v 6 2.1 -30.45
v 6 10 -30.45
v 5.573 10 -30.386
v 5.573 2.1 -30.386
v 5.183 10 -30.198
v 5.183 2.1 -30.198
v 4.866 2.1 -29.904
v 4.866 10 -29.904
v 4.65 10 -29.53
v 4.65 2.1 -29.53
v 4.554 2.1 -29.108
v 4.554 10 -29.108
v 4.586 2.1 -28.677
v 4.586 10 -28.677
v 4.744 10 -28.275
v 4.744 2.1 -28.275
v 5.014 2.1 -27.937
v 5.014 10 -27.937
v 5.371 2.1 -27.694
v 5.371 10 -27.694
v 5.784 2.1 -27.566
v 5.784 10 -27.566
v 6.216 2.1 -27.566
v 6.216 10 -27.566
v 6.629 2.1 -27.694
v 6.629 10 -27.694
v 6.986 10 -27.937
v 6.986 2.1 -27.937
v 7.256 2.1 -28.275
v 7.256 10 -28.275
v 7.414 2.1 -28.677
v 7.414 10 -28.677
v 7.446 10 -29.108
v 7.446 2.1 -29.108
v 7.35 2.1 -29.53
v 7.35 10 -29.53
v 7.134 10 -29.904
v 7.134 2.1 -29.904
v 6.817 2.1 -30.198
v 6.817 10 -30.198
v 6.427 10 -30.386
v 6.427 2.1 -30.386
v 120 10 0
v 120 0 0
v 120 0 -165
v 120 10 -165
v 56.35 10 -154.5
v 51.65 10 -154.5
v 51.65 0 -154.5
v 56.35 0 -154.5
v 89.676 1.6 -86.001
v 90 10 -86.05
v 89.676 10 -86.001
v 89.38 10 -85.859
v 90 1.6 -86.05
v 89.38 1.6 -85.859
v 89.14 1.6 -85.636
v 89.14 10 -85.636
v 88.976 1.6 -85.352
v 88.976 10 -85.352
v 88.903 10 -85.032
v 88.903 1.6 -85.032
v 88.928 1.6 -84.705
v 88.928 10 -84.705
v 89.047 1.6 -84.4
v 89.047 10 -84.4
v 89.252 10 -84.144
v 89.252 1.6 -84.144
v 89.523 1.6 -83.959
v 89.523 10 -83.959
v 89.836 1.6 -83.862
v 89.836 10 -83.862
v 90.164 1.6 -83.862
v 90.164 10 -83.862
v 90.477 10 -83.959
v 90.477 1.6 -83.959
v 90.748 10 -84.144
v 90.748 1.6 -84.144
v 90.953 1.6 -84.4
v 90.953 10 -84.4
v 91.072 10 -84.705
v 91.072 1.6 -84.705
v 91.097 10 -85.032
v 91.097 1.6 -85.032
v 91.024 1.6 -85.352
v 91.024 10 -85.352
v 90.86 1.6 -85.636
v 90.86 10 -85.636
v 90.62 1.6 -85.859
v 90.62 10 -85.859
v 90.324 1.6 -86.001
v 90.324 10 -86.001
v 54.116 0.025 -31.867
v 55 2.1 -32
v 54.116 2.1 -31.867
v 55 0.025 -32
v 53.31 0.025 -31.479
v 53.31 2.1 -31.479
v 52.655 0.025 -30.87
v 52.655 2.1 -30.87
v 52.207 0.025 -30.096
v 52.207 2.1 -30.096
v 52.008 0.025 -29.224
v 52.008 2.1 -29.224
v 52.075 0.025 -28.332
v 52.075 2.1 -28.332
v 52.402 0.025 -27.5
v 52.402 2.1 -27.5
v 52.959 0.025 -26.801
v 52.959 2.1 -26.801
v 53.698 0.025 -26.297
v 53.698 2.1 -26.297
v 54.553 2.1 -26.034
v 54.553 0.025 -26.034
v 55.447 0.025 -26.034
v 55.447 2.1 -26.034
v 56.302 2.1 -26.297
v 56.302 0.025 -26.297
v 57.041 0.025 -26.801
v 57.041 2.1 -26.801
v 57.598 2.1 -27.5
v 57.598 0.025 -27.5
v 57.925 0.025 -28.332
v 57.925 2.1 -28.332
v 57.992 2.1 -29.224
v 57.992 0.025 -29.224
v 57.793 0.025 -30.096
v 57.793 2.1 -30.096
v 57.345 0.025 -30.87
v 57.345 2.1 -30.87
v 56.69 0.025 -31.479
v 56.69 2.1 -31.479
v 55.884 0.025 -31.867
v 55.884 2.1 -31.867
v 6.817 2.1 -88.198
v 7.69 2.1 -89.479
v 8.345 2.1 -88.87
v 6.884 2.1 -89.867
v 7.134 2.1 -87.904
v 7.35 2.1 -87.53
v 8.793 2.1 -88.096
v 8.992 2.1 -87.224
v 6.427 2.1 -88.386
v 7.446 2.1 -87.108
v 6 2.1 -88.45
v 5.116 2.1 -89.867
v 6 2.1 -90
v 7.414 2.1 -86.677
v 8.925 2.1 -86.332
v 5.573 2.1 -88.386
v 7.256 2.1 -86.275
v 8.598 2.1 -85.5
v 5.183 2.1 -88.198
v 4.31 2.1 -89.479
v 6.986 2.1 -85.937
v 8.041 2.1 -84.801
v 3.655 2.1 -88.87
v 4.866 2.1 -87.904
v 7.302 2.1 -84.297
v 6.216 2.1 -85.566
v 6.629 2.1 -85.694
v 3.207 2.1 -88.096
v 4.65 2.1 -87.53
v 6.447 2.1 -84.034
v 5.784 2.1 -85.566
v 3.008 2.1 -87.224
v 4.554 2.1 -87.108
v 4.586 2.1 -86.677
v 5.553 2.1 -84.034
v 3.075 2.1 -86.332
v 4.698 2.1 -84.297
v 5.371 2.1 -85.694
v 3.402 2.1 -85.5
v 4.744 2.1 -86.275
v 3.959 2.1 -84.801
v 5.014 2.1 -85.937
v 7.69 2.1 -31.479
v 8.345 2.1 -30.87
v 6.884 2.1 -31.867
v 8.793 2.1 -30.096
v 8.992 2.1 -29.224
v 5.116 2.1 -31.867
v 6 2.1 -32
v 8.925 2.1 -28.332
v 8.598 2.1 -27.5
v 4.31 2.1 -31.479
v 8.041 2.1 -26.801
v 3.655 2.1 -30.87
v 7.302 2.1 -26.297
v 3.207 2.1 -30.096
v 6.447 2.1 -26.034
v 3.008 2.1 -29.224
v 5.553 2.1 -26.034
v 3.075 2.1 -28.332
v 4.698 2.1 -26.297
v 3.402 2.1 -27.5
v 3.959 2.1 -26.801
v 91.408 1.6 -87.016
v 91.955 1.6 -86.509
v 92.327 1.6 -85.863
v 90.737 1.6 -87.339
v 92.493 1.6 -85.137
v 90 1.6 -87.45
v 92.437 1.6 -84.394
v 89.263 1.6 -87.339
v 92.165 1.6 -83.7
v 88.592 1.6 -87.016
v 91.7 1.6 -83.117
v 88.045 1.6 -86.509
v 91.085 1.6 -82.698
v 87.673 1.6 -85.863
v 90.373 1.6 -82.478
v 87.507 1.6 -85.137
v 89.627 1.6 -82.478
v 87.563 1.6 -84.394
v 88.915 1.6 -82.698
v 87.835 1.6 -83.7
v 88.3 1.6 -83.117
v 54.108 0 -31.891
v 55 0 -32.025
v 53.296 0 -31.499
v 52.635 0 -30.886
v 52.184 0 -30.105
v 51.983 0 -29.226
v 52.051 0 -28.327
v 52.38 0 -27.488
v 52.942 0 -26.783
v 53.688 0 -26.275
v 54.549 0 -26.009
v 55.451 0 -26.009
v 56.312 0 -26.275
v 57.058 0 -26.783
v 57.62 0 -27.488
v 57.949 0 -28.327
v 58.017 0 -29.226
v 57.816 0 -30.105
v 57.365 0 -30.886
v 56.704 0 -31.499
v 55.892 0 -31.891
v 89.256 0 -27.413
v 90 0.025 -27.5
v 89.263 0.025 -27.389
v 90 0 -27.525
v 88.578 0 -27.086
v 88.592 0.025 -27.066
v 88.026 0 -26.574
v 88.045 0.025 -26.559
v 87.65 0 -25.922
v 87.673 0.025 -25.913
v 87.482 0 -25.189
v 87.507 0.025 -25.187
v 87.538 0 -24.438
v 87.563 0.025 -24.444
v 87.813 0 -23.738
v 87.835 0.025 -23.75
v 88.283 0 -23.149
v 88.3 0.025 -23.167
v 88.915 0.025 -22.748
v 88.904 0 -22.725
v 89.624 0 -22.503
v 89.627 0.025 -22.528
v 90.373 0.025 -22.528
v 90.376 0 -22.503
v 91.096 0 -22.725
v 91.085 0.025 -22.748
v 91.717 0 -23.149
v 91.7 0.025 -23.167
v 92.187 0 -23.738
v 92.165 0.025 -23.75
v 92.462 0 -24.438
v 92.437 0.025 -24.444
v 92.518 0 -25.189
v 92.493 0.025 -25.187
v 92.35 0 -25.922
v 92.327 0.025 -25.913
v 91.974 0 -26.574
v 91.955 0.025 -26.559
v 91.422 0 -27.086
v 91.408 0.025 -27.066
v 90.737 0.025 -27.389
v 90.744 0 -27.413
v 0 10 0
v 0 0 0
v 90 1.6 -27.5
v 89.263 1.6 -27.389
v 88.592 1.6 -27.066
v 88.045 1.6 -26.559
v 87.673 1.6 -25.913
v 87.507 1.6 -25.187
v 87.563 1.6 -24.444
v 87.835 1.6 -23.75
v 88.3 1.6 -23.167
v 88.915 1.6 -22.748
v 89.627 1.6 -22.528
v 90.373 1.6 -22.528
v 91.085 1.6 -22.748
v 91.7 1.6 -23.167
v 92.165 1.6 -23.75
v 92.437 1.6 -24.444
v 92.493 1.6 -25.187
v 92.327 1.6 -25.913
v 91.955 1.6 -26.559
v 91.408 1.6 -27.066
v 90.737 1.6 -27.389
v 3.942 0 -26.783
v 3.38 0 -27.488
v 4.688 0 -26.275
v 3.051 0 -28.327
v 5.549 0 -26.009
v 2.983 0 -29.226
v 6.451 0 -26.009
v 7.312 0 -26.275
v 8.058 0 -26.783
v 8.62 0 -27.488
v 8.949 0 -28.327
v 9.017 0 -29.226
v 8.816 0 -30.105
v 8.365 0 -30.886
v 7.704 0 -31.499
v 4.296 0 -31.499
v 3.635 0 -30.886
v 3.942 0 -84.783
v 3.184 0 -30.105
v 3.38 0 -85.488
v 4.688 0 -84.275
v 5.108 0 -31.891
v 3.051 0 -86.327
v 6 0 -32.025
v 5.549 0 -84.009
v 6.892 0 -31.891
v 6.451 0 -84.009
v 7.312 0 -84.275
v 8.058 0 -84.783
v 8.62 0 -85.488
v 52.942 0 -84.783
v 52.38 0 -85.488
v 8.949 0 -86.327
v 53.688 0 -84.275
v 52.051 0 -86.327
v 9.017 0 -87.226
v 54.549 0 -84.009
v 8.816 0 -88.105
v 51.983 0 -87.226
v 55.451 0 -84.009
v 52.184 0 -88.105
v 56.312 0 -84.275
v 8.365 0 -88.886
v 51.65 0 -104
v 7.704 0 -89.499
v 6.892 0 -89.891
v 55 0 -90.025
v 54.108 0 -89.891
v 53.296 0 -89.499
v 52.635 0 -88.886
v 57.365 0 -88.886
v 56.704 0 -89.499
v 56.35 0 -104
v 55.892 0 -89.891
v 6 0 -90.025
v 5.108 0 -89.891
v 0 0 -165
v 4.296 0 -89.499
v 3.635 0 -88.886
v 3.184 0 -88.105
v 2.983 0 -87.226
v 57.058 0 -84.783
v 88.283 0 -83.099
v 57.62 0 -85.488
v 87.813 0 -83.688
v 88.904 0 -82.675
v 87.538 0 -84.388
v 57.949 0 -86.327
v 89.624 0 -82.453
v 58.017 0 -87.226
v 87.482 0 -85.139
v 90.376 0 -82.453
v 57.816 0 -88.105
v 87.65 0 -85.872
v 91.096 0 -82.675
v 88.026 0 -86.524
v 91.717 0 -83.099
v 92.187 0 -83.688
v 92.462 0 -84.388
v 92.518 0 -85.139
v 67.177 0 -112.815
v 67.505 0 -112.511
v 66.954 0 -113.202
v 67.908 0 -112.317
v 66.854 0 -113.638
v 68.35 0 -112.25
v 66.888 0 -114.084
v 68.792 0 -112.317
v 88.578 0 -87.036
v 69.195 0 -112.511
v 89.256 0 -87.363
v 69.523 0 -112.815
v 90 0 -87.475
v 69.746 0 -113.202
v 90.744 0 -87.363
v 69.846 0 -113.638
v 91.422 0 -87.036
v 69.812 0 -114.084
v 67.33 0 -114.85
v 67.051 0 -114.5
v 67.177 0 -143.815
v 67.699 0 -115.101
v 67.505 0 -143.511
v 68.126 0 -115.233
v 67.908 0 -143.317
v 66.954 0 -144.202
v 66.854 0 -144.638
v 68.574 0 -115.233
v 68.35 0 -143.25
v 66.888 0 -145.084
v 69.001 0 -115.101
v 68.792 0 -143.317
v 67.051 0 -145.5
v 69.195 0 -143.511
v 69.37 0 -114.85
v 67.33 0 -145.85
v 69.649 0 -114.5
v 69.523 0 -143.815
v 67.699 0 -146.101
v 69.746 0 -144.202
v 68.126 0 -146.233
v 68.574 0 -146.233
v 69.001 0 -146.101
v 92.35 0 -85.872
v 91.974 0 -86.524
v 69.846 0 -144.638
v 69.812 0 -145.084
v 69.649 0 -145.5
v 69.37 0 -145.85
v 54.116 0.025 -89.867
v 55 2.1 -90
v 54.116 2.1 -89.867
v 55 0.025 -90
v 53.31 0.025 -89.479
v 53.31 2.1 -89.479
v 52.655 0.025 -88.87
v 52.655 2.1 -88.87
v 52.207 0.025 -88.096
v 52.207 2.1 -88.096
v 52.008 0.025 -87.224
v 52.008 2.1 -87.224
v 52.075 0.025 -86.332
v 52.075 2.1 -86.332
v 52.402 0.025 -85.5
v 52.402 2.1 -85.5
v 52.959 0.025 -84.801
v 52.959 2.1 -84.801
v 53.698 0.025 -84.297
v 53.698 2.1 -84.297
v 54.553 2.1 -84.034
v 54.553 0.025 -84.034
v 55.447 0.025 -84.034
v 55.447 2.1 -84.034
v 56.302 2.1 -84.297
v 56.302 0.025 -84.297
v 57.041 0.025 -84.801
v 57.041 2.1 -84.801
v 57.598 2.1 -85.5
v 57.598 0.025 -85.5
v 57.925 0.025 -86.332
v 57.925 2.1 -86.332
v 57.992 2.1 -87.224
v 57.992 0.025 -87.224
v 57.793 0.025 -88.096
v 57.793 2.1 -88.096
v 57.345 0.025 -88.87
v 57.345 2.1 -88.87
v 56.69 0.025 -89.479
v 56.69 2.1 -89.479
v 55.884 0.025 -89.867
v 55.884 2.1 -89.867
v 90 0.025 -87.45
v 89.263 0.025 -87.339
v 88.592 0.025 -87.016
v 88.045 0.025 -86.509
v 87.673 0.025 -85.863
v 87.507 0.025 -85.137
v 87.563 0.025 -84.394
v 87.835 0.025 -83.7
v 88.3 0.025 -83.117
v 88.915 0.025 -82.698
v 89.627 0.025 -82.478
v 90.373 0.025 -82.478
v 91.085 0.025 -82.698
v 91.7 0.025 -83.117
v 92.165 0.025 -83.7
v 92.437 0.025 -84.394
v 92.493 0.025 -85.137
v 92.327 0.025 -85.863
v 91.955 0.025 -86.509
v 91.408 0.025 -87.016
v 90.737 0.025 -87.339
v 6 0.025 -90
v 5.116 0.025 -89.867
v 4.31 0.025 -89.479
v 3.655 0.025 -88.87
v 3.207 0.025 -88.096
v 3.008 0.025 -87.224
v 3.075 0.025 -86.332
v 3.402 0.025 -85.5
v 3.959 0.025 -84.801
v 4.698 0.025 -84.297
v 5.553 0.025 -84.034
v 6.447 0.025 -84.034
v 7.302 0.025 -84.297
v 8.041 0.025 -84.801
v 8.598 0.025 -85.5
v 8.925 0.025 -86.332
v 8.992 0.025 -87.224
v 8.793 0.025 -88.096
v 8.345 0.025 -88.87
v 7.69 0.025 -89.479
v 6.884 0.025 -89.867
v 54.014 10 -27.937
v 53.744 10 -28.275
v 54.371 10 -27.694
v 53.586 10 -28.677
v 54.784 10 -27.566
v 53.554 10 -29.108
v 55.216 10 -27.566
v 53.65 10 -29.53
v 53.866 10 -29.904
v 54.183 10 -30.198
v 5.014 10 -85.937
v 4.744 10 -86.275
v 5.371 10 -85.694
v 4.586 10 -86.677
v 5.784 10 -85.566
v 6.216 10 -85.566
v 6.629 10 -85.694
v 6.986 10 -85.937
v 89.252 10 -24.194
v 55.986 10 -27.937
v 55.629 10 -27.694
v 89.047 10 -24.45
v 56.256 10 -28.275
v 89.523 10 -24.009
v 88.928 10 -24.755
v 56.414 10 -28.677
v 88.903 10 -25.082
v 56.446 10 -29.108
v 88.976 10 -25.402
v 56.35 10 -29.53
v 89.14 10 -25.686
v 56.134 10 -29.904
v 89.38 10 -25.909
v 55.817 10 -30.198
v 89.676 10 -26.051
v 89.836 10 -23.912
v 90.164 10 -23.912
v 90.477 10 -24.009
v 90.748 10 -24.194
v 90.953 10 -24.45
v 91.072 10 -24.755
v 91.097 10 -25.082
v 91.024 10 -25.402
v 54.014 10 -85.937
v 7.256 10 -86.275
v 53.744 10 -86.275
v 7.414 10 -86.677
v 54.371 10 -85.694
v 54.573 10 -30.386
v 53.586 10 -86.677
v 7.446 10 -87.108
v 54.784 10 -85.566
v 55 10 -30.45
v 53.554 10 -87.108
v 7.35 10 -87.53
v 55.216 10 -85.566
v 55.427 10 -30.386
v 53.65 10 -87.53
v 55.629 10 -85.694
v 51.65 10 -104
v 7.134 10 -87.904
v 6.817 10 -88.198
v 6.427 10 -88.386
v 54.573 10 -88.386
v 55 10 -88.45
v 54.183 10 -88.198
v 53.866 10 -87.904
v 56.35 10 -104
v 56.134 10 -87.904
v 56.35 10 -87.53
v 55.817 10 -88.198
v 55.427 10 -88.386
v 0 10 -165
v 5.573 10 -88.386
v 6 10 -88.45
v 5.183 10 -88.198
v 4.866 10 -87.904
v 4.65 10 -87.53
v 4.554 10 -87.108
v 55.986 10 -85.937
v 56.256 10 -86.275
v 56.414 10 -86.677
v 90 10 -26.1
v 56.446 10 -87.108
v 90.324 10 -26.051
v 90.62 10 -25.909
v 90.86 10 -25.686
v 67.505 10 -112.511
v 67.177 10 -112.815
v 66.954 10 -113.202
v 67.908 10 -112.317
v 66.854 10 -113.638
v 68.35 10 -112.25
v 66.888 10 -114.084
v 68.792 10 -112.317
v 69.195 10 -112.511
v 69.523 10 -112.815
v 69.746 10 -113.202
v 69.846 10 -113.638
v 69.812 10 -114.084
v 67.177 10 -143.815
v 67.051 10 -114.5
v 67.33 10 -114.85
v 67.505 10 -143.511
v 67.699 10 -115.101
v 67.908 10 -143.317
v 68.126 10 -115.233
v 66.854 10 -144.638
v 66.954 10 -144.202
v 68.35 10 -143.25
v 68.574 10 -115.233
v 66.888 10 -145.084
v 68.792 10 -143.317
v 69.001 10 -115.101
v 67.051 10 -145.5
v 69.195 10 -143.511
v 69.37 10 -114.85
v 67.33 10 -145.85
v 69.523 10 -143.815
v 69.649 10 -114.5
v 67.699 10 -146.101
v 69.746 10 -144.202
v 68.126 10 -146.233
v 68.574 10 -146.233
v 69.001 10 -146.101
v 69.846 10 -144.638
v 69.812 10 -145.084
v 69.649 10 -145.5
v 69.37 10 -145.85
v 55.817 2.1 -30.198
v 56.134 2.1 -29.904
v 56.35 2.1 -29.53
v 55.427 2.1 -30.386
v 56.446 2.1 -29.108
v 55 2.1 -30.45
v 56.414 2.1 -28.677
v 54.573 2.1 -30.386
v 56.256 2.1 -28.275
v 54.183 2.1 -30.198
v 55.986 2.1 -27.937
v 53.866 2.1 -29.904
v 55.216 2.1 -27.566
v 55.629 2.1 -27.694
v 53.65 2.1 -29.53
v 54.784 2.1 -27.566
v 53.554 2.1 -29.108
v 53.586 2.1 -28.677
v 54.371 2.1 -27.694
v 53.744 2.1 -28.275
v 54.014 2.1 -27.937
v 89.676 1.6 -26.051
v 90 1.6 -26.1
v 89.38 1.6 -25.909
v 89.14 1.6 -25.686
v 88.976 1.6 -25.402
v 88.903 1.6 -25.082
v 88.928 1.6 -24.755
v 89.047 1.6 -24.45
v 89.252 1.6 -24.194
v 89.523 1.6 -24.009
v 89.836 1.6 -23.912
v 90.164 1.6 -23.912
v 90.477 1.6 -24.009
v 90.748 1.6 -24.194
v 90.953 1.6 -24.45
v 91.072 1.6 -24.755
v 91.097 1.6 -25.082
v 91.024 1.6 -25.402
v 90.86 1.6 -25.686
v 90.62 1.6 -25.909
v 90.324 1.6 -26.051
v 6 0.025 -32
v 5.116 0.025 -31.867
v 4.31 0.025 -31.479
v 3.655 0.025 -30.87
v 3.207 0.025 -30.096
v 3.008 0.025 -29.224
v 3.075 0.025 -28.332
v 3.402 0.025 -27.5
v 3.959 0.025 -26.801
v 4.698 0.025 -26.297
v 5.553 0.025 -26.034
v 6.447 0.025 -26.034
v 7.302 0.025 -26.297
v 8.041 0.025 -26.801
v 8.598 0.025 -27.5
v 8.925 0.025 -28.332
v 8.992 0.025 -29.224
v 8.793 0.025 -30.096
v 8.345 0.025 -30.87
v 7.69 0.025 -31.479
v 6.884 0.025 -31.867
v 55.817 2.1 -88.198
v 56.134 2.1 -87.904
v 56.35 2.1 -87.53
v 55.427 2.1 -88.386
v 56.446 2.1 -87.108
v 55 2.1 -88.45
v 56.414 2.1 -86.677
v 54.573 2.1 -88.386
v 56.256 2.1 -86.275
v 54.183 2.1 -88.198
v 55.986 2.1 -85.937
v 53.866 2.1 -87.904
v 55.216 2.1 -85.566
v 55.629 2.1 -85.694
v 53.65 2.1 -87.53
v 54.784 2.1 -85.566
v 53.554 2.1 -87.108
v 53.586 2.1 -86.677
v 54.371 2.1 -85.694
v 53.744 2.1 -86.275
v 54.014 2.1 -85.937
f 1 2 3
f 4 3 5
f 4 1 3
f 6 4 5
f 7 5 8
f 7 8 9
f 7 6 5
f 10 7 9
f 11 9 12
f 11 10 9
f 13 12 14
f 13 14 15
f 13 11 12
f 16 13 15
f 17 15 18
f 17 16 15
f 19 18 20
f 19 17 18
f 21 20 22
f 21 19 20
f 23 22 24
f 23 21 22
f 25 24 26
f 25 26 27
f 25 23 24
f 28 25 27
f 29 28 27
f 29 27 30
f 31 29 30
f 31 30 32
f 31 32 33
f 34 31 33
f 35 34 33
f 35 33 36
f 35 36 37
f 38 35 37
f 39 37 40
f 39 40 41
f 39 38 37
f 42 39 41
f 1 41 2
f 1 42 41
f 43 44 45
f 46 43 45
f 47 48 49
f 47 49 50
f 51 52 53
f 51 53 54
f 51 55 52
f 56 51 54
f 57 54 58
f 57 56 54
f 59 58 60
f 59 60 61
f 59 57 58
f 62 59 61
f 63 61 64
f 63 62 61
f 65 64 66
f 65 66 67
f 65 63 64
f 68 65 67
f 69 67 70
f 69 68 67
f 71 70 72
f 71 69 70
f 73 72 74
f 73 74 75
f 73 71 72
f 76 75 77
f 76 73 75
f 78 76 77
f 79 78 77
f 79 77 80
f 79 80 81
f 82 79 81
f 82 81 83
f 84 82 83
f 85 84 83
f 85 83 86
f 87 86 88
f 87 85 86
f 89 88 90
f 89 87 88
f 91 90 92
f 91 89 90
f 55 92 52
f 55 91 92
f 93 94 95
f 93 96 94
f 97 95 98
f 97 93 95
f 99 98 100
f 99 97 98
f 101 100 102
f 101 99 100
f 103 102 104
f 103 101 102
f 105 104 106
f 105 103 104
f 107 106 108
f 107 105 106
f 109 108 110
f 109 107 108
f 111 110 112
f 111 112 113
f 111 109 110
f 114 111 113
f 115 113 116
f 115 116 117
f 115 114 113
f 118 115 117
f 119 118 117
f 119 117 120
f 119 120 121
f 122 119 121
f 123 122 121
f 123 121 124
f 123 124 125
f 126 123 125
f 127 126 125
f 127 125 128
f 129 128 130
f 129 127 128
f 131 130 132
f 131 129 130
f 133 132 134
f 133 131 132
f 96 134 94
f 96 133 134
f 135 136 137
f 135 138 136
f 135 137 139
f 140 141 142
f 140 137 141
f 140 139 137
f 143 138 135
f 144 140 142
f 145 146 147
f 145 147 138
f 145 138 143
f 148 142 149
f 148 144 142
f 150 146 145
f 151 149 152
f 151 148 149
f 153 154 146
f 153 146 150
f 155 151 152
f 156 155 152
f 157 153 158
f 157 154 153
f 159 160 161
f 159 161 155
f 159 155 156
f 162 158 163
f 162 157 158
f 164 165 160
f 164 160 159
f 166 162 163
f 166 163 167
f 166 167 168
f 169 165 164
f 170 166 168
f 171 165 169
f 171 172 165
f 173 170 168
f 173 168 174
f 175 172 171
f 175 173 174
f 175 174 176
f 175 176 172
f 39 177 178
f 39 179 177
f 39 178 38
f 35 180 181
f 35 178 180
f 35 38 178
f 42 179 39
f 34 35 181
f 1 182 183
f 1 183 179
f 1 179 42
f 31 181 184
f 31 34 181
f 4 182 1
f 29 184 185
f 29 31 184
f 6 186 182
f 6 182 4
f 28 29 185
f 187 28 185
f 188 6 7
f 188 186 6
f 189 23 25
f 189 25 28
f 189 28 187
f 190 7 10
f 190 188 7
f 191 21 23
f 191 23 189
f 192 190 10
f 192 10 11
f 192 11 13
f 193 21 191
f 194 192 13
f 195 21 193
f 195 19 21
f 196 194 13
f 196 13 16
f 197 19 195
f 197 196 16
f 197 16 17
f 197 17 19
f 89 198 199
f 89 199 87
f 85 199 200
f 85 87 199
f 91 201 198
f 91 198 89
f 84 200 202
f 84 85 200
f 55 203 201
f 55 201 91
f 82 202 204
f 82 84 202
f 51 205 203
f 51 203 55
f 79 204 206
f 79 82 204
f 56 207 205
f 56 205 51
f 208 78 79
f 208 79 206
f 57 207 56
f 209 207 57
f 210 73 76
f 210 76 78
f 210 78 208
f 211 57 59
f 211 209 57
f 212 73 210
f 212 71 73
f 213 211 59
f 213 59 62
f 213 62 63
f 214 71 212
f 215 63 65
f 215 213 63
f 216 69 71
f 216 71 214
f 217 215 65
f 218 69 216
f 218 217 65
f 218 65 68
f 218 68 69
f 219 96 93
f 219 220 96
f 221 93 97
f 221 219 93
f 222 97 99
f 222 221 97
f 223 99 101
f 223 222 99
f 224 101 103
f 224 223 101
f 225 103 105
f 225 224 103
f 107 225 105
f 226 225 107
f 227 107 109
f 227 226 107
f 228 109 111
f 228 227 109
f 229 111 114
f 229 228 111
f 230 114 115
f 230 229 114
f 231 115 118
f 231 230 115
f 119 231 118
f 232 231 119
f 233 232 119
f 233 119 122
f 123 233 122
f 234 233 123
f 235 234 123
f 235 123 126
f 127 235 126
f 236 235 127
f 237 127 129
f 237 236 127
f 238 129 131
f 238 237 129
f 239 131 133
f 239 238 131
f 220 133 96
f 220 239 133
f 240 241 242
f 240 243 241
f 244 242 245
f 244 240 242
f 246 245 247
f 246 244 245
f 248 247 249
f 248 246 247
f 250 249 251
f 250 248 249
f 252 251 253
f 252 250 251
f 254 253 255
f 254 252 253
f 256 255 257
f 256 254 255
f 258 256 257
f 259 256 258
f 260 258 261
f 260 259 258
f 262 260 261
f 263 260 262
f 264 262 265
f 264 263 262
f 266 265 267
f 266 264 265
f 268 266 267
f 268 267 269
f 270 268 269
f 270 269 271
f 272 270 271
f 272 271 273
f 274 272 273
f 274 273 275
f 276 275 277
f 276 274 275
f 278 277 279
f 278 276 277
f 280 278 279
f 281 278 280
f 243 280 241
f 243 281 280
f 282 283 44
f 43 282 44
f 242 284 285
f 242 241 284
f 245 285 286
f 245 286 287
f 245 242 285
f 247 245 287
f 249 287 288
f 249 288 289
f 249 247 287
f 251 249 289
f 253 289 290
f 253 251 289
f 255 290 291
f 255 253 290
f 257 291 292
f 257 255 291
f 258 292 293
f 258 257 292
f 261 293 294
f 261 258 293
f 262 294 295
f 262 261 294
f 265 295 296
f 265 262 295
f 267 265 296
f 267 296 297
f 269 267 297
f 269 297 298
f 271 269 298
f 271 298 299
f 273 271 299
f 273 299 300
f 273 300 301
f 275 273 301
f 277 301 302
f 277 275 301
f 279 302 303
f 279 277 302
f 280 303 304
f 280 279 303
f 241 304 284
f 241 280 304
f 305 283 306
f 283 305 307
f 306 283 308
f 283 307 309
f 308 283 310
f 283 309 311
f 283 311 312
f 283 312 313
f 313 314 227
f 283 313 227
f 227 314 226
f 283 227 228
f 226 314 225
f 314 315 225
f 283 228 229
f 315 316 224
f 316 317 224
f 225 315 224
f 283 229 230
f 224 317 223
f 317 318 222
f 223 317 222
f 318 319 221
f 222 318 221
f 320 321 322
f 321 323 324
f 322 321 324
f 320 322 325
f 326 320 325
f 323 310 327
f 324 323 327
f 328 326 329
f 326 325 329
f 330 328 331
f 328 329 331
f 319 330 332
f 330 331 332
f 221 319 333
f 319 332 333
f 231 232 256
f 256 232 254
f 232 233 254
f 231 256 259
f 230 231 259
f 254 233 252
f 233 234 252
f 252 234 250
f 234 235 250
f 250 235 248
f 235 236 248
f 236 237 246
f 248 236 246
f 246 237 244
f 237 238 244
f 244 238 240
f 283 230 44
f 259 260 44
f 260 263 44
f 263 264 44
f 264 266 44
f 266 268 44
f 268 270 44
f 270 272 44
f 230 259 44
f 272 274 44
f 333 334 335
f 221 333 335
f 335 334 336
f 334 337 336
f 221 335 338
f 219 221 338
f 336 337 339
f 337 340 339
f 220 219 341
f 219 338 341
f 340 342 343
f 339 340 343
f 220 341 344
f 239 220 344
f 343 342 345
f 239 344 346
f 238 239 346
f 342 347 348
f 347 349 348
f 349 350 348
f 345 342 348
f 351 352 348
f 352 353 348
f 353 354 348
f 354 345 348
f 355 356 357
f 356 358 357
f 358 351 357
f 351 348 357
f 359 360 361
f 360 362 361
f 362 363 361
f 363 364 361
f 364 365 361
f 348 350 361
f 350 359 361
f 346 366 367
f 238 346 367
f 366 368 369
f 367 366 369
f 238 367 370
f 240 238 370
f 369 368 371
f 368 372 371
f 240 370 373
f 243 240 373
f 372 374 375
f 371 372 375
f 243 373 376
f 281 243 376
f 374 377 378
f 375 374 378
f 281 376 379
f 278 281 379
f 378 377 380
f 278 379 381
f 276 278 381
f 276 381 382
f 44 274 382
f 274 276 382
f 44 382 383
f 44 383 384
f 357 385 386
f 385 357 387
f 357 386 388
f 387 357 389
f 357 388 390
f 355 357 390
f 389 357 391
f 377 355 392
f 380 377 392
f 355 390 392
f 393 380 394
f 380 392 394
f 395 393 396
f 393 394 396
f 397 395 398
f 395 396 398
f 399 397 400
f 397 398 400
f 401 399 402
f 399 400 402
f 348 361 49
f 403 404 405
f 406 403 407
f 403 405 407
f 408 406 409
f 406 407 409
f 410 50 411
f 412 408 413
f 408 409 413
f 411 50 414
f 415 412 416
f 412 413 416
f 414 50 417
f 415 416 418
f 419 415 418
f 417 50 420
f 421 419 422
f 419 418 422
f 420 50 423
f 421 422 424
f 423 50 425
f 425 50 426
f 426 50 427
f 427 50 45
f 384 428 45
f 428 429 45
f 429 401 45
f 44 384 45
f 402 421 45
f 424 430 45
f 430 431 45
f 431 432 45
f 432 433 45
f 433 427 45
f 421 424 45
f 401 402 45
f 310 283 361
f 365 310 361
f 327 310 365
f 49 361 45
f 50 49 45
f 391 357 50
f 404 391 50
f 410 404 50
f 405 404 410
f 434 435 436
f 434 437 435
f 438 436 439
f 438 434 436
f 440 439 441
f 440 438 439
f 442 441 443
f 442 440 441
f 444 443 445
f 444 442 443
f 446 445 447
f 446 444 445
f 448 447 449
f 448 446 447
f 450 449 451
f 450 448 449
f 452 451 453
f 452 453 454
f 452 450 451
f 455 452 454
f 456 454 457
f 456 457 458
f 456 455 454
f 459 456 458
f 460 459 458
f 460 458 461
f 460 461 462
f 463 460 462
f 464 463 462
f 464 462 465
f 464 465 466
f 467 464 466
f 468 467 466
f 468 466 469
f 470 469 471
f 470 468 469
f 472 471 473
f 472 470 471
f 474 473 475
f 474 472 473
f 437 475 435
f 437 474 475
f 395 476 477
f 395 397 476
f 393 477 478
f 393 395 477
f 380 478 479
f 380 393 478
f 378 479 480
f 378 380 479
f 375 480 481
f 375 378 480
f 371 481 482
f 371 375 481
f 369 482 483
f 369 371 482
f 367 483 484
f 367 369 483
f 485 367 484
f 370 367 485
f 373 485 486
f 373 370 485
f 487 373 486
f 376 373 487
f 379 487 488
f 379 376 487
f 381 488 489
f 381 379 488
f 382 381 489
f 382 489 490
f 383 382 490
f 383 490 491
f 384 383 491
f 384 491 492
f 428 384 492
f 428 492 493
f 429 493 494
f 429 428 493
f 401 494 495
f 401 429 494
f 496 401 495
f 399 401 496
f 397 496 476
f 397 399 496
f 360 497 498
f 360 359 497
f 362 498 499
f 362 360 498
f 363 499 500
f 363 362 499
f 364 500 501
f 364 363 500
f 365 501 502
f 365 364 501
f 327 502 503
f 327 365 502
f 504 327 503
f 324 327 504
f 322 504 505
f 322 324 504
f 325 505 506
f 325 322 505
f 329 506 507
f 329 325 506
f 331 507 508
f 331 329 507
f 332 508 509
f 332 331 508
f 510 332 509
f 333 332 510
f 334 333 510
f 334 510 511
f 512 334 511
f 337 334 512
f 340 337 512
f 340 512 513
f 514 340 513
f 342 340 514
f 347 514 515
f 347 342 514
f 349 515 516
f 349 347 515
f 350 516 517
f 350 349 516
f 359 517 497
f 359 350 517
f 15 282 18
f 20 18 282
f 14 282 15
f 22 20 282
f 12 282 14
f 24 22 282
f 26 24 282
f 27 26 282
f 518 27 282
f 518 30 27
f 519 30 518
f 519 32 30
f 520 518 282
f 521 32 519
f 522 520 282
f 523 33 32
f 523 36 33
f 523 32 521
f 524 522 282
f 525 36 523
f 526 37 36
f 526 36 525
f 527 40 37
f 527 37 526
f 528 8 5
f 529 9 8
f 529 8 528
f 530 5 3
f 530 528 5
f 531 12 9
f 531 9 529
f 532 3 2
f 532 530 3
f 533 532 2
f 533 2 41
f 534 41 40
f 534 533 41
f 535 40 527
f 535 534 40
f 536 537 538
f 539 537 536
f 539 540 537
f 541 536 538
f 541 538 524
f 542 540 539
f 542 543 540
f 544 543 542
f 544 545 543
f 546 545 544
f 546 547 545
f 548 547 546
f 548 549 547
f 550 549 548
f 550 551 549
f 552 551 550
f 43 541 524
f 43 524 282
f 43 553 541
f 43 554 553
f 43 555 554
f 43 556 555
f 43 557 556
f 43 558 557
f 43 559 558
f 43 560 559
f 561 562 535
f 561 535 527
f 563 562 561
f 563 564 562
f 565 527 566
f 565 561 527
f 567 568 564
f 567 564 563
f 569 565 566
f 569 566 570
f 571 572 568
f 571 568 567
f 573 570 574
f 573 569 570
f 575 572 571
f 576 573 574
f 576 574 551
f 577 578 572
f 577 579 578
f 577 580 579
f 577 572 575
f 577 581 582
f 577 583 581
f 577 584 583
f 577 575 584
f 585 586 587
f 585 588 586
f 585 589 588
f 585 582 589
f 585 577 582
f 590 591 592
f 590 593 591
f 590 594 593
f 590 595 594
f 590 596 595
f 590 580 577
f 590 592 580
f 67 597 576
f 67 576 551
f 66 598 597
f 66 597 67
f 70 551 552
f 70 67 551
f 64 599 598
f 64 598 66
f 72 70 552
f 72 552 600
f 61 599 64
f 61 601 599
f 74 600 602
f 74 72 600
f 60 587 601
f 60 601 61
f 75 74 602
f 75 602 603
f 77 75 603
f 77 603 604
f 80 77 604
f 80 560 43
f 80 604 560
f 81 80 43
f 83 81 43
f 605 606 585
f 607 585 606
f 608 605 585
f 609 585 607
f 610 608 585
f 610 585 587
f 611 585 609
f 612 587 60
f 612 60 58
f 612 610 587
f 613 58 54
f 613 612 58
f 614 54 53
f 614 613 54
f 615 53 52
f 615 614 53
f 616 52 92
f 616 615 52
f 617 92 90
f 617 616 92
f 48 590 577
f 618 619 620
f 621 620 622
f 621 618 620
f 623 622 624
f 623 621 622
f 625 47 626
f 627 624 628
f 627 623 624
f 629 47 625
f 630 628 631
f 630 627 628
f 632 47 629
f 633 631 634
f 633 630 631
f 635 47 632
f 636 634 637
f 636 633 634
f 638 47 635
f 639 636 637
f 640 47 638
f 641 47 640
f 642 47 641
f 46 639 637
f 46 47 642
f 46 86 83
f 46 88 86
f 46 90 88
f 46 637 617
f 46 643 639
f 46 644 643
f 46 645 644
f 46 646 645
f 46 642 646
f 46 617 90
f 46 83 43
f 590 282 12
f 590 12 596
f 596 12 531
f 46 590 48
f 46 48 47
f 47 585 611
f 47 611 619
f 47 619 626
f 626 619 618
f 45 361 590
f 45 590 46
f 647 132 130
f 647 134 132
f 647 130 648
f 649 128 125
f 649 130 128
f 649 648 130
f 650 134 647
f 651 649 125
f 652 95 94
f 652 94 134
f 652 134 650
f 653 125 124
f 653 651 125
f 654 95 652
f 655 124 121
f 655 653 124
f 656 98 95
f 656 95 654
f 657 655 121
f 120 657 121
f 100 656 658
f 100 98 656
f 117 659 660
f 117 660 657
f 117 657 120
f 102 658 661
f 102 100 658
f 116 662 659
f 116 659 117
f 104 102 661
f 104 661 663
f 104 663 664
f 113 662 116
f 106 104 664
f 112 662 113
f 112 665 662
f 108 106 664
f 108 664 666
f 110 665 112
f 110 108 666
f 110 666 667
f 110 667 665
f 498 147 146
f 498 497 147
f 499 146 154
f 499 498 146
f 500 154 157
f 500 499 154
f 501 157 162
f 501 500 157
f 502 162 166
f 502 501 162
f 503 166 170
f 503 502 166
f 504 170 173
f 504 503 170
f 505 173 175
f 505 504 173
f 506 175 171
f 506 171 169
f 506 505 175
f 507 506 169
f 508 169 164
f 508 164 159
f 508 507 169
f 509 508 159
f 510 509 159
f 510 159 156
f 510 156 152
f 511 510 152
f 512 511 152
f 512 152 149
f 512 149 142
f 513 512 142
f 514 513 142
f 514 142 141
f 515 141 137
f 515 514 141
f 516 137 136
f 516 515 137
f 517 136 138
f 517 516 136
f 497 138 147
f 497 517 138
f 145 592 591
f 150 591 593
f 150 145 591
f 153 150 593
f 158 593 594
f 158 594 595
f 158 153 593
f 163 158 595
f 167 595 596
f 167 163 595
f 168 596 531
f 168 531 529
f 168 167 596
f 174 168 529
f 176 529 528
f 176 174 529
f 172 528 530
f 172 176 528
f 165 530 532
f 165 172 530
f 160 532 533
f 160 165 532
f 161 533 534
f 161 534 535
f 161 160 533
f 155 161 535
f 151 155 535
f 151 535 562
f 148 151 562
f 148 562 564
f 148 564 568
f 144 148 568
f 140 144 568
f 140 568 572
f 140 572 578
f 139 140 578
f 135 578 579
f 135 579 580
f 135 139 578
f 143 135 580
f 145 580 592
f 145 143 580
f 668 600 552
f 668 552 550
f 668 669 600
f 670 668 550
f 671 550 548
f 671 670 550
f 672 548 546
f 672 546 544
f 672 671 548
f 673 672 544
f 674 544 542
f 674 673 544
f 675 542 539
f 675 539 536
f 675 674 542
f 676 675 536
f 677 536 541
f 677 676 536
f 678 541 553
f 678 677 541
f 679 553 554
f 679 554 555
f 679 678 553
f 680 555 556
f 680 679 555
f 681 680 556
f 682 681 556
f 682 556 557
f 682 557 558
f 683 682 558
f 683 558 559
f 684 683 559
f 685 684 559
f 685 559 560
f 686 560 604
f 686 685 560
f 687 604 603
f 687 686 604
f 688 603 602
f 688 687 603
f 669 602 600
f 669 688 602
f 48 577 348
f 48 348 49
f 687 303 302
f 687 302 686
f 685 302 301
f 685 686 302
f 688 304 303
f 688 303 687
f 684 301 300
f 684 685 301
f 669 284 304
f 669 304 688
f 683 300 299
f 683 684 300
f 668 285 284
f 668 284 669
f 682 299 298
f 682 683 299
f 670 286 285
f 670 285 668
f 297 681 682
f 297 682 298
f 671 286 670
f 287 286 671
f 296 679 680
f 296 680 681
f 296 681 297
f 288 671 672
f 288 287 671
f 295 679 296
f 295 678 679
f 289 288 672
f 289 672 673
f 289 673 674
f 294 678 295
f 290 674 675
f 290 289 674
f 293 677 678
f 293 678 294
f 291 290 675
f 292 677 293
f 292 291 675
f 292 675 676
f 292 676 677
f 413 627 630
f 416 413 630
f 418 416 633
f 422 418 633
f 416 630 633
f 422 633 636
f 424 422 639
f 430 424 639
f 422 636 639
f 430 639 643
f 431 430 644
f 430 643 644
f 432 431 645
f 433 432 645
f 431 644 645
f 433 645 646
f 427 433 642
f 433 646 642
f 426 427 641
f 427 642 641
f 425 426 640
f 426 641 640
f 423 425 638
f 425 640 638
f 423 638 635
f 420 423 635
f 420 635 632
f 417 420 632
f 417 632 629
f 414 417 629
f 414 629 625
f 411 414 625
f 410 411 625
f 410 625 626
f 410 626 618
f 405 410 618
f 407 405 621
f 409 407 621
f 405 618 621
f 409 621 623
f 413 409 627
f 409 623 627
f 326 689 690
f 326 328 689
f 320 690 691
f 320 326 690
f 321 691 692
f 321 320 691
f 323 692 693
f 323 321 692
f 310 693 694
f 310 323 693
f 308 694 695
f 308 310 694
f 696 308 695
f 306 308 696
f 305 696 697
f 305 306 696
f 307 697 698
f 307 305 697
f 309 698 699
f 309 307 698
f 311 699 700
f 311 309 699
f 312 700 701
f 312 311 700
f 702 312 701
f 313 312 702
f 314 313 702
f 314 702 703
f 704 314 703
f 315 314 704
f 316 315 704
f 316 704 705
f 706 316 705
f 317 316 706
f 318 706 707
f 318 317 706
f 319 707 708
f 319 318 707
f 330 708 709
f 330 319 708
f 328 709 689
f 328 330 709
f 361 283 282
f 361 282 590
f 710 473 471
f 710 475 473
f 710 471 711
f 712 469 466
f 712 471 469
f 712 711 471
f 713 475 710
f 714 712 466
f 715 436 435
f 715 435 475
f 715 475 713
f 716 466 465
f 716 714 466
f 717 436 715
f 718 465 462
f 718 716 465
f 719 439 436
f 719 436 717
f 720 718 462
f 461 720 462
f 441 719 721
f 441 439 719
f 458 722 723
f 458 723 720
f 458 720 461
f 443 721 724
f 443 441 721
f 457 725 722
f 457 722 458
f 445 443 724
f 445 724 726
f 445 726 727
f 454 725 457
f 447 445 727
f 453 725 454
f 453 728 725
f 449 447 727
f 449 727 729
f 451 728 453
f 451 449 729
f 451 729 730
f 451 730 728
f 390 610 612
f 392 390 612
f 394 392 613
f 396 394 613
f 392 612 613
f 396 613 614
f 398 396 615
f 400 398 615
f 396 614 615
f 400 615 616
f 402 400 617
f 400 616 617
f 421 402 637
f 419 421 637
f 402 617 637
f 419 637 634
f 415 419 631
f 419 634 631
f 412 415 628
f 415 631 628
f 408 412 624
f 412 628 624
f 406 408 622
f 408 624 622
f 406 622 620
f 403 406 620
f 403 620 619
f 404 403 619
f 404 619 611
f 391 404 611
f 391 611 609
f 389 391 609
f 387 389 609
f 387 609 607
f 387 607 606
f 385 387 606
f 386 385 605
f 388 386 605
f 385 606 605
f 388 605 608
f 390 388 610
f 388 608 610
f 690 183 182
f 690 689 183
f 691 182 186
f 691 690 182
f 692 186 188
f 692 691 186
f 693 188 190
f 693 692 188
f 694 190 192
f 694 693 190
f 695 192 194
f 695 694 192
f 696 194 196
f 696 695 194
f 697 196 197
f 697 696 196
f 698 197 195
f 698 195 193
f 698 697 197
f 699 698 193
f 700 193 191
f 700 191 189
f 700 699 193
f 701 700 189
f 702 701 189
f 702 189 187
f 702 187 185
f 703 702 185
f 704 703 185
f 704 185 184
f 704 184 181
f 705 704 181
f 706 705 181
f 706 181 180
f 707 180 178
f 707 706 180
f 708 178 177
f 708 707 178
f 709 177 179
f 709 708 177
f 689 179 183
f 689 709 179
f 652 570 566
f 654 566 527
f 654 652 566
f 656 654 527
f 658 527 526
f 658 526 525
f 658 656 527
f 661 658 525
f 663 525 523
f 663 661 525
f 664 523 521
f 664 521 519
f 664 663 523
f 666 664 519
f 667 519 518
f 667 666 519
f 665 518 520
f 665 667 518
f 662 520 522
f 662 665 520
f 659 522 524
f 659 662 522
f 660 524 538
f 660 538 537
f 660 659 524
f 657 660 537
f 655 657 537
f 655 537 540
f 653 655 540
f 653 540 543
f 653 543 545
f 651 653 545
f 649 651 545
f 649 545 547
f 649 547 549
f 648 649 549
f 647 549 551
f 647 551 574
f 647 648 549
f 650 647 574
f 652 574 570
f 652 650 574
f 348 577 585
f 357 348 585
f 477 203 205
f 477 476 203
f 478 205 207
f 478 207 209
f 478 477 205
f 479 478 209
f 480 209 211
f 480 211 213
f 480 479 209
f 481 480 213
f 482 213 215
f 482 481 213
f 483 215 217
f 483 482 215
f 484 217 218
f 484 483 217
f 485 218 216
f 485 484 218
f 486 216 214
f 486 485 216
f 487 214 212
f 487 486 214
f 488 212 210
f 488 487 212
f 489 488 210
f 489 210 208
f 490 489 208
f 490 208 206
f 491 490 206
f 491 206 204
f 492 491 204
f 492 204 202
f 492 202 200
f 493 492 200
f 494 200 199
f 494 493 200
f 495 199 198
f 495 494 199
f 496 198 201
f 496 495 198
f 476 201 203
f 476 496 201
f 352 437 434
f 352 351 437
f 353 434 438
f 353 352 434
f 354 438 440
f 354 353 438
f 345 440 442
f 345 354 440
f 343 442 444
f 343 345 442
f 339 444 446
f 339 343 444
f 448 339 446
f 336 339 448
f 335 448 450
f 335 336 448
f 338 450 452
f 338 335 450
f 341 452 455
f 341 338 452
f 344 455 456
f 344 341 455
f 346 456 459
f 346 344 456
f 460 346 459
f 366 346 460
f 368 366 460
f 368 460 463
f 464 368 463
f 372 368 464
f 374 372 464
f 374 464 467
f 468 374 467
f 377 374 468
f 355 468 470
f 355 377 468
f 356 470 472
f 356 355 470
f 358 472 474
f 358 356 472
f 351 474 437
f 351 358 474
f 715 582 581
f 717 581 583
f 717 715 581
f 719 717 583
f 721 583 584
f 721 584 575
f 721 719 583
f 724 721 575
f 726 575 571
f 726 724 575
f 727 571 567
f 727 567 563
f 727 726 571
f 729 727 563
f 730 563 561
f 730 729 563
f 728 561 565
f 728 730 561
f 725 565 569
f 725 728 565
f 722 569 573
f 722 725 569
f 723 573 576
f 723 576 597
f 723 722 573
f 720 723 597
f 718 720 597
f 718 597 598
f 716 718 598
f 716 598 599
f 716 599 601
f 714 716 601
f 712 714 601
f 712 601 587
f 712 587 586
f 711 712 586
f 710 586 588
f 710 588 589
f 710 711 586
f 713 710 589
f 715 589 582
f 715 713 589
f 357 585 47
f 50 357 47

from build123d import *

# Parameters (mm, degrees)
SKETCH1_W                     = 120
SKETCH1_H                     = 165
BASE_DEPTH                    = 10
PI_MOUNTHOLES_AT_2_COUNT      = 2
PI_MOUNTHOLES_AT_2_PITCH      = 49
PI_MOUNTHOLES_AT_3_COUNT      = 2
PI_MOUNTHOLES_AT_3_PITCH      = 75.927597091
PI_MOUNTHOLES_AT_4_COUNT      = 2
PI_MOUNTHOLES_AT_4_PITCH      = 58
BATTERY_MOUNTHOLES_AT_2_COUNT = 2
BATTERY_MOUNTHOLES_AT_2_PITCH = 59.95
SKETCH17_W                    = 4.7
SKETCH17_H                    = 50.5
STEPPERBRACKETSLOT_DEPTH      = 10
SKETCH18_R                    = 1.5
ANGLEBRACKET_MOUNTHOLES_DEPTH = 10


with BuildPart() as part:
    # Sketch1 → Base (new body)
    with BuildSketch(Plane(origin=(0, 0, 0), x_dir=(1, 0, 0), z_dir=(0, 1, 0))):
        with Locations((60, 82.5)):
            Rectangle(SKETCH1_W, SKETCH1_H)
    extrude(amount=BASE_DEPTH)

    # Sketch14 → Pi-MountHoles (revolve, cut)
    with BuildSketch(Plane(origin=(6, 0, -29), x_dir=(0, 0, -1), z_dir=(1, 0, 0))):
        Polygon((0, 0), (0, 10), (1.45, 10), (1.45, 2.1), (3, 2.1), (3, 0.025), (3.025, 0), align=None)
    pi_mountholes = revolve(axis=Axis((6, -6.35, -29), (0, 1, 0)), mode=Mode.SUBTRACT)

    # Pi-MountHoles at 2: Pi-MountHoles ×2
    with Locations(*[(i * PI_MOUNTHOLES_AT_2_PITCH, 0, 0) for i in range(1, PI_MOUNTHOLES_AT_2_COUNT)]):
        add(pi_mountholes, mode=Mode.SUBTRACT)

    # Pi-MountHoles at 3: Pi-MountHoles ×2
    with Locations(*[Vector(0.6453516491682099, 0, -0.7638856255460447) * (i * PI_MOUNTHOLES_AT_3_PITCH) for i in range(1, PI_MOUNTHOLES_AT_3_COUNT)]):
        add(pi_mountholes, mode=Mode.SUBTRACT)

    # Pi-MountHoles at 4: Pi-MountHoles ×2
    with Locations(*[(0, 0, -i * PI_MOUNTHOLES_AT_4_PITCH) for i in range(1, PI_MOUNTHOLES_AT_4_COUNT)]):
        add(pi_mountholes, mode=Mode.SUBTRACT)

    # Sketch16 → Battery-MountHoles (revolve, cut)
    with BuildSketch(Plane(origin=(90, 0, -25), x_dir=(0, 0, -1), z_dir=(1, 0, 0))):
        Polygon((0, 0), (0, 10), (1.1, 10), (1.1, 1.6), (2.5, 1.6), (2.5, 0.025), (2.525, 0), align=None)
    battery_mountholes = revolve(axis=Axis((90, -6.35, -25), (0, 1, 0)), mode=Mode.SUBTRACT)

    # Battery-MountHoles at 2: Battery-MountHoles ×2
    with Locations(*[(0, 0, -i * BATTERY_MOUNTHOLES_AT_2_PITCH) for i in range(1, BATTERY_MOUNTHOLES_AT_2_COUNT)]):
        add(battery_mountholes, mode=Mode.SUBTRACT)

    # Sketch17 → StepperBracketSlot (cut)
    with BuildSketch(Plane(origin=(0, 10, 0), x_dir=(1, 0, 0), z_dir=(0, 1, 0))):
        with Locations((54, 129.25)):
            Rectangle(SKETCH17_W, SKETCH17_H)
    extrude(amount=-STEPPERBRACKETSLOT_DEPTH, mode=Mode.SUBTRACT)

    # Sketch18 → AngleBracket-MountHoles (cut)
    with BuildSketch(Plane(origin=(0, 10, 0), x_dir=(1, 0, 0), z_dir=(0, 1, 0))):
        with Locations(Location((68.35, 144.75, 0), (0, 0, 270))):
            Circle(SKETCH18_R)
        with Locations(Location((68.35, 113.75, 0), (0, 0, 270))):
            Circle(SKETCH18_R)
    extrude(amount=-ANGLEBRACKET_MOUNTHOLES_DEPTH, mode=Mode.SUBTRACT)


solid = part.part
